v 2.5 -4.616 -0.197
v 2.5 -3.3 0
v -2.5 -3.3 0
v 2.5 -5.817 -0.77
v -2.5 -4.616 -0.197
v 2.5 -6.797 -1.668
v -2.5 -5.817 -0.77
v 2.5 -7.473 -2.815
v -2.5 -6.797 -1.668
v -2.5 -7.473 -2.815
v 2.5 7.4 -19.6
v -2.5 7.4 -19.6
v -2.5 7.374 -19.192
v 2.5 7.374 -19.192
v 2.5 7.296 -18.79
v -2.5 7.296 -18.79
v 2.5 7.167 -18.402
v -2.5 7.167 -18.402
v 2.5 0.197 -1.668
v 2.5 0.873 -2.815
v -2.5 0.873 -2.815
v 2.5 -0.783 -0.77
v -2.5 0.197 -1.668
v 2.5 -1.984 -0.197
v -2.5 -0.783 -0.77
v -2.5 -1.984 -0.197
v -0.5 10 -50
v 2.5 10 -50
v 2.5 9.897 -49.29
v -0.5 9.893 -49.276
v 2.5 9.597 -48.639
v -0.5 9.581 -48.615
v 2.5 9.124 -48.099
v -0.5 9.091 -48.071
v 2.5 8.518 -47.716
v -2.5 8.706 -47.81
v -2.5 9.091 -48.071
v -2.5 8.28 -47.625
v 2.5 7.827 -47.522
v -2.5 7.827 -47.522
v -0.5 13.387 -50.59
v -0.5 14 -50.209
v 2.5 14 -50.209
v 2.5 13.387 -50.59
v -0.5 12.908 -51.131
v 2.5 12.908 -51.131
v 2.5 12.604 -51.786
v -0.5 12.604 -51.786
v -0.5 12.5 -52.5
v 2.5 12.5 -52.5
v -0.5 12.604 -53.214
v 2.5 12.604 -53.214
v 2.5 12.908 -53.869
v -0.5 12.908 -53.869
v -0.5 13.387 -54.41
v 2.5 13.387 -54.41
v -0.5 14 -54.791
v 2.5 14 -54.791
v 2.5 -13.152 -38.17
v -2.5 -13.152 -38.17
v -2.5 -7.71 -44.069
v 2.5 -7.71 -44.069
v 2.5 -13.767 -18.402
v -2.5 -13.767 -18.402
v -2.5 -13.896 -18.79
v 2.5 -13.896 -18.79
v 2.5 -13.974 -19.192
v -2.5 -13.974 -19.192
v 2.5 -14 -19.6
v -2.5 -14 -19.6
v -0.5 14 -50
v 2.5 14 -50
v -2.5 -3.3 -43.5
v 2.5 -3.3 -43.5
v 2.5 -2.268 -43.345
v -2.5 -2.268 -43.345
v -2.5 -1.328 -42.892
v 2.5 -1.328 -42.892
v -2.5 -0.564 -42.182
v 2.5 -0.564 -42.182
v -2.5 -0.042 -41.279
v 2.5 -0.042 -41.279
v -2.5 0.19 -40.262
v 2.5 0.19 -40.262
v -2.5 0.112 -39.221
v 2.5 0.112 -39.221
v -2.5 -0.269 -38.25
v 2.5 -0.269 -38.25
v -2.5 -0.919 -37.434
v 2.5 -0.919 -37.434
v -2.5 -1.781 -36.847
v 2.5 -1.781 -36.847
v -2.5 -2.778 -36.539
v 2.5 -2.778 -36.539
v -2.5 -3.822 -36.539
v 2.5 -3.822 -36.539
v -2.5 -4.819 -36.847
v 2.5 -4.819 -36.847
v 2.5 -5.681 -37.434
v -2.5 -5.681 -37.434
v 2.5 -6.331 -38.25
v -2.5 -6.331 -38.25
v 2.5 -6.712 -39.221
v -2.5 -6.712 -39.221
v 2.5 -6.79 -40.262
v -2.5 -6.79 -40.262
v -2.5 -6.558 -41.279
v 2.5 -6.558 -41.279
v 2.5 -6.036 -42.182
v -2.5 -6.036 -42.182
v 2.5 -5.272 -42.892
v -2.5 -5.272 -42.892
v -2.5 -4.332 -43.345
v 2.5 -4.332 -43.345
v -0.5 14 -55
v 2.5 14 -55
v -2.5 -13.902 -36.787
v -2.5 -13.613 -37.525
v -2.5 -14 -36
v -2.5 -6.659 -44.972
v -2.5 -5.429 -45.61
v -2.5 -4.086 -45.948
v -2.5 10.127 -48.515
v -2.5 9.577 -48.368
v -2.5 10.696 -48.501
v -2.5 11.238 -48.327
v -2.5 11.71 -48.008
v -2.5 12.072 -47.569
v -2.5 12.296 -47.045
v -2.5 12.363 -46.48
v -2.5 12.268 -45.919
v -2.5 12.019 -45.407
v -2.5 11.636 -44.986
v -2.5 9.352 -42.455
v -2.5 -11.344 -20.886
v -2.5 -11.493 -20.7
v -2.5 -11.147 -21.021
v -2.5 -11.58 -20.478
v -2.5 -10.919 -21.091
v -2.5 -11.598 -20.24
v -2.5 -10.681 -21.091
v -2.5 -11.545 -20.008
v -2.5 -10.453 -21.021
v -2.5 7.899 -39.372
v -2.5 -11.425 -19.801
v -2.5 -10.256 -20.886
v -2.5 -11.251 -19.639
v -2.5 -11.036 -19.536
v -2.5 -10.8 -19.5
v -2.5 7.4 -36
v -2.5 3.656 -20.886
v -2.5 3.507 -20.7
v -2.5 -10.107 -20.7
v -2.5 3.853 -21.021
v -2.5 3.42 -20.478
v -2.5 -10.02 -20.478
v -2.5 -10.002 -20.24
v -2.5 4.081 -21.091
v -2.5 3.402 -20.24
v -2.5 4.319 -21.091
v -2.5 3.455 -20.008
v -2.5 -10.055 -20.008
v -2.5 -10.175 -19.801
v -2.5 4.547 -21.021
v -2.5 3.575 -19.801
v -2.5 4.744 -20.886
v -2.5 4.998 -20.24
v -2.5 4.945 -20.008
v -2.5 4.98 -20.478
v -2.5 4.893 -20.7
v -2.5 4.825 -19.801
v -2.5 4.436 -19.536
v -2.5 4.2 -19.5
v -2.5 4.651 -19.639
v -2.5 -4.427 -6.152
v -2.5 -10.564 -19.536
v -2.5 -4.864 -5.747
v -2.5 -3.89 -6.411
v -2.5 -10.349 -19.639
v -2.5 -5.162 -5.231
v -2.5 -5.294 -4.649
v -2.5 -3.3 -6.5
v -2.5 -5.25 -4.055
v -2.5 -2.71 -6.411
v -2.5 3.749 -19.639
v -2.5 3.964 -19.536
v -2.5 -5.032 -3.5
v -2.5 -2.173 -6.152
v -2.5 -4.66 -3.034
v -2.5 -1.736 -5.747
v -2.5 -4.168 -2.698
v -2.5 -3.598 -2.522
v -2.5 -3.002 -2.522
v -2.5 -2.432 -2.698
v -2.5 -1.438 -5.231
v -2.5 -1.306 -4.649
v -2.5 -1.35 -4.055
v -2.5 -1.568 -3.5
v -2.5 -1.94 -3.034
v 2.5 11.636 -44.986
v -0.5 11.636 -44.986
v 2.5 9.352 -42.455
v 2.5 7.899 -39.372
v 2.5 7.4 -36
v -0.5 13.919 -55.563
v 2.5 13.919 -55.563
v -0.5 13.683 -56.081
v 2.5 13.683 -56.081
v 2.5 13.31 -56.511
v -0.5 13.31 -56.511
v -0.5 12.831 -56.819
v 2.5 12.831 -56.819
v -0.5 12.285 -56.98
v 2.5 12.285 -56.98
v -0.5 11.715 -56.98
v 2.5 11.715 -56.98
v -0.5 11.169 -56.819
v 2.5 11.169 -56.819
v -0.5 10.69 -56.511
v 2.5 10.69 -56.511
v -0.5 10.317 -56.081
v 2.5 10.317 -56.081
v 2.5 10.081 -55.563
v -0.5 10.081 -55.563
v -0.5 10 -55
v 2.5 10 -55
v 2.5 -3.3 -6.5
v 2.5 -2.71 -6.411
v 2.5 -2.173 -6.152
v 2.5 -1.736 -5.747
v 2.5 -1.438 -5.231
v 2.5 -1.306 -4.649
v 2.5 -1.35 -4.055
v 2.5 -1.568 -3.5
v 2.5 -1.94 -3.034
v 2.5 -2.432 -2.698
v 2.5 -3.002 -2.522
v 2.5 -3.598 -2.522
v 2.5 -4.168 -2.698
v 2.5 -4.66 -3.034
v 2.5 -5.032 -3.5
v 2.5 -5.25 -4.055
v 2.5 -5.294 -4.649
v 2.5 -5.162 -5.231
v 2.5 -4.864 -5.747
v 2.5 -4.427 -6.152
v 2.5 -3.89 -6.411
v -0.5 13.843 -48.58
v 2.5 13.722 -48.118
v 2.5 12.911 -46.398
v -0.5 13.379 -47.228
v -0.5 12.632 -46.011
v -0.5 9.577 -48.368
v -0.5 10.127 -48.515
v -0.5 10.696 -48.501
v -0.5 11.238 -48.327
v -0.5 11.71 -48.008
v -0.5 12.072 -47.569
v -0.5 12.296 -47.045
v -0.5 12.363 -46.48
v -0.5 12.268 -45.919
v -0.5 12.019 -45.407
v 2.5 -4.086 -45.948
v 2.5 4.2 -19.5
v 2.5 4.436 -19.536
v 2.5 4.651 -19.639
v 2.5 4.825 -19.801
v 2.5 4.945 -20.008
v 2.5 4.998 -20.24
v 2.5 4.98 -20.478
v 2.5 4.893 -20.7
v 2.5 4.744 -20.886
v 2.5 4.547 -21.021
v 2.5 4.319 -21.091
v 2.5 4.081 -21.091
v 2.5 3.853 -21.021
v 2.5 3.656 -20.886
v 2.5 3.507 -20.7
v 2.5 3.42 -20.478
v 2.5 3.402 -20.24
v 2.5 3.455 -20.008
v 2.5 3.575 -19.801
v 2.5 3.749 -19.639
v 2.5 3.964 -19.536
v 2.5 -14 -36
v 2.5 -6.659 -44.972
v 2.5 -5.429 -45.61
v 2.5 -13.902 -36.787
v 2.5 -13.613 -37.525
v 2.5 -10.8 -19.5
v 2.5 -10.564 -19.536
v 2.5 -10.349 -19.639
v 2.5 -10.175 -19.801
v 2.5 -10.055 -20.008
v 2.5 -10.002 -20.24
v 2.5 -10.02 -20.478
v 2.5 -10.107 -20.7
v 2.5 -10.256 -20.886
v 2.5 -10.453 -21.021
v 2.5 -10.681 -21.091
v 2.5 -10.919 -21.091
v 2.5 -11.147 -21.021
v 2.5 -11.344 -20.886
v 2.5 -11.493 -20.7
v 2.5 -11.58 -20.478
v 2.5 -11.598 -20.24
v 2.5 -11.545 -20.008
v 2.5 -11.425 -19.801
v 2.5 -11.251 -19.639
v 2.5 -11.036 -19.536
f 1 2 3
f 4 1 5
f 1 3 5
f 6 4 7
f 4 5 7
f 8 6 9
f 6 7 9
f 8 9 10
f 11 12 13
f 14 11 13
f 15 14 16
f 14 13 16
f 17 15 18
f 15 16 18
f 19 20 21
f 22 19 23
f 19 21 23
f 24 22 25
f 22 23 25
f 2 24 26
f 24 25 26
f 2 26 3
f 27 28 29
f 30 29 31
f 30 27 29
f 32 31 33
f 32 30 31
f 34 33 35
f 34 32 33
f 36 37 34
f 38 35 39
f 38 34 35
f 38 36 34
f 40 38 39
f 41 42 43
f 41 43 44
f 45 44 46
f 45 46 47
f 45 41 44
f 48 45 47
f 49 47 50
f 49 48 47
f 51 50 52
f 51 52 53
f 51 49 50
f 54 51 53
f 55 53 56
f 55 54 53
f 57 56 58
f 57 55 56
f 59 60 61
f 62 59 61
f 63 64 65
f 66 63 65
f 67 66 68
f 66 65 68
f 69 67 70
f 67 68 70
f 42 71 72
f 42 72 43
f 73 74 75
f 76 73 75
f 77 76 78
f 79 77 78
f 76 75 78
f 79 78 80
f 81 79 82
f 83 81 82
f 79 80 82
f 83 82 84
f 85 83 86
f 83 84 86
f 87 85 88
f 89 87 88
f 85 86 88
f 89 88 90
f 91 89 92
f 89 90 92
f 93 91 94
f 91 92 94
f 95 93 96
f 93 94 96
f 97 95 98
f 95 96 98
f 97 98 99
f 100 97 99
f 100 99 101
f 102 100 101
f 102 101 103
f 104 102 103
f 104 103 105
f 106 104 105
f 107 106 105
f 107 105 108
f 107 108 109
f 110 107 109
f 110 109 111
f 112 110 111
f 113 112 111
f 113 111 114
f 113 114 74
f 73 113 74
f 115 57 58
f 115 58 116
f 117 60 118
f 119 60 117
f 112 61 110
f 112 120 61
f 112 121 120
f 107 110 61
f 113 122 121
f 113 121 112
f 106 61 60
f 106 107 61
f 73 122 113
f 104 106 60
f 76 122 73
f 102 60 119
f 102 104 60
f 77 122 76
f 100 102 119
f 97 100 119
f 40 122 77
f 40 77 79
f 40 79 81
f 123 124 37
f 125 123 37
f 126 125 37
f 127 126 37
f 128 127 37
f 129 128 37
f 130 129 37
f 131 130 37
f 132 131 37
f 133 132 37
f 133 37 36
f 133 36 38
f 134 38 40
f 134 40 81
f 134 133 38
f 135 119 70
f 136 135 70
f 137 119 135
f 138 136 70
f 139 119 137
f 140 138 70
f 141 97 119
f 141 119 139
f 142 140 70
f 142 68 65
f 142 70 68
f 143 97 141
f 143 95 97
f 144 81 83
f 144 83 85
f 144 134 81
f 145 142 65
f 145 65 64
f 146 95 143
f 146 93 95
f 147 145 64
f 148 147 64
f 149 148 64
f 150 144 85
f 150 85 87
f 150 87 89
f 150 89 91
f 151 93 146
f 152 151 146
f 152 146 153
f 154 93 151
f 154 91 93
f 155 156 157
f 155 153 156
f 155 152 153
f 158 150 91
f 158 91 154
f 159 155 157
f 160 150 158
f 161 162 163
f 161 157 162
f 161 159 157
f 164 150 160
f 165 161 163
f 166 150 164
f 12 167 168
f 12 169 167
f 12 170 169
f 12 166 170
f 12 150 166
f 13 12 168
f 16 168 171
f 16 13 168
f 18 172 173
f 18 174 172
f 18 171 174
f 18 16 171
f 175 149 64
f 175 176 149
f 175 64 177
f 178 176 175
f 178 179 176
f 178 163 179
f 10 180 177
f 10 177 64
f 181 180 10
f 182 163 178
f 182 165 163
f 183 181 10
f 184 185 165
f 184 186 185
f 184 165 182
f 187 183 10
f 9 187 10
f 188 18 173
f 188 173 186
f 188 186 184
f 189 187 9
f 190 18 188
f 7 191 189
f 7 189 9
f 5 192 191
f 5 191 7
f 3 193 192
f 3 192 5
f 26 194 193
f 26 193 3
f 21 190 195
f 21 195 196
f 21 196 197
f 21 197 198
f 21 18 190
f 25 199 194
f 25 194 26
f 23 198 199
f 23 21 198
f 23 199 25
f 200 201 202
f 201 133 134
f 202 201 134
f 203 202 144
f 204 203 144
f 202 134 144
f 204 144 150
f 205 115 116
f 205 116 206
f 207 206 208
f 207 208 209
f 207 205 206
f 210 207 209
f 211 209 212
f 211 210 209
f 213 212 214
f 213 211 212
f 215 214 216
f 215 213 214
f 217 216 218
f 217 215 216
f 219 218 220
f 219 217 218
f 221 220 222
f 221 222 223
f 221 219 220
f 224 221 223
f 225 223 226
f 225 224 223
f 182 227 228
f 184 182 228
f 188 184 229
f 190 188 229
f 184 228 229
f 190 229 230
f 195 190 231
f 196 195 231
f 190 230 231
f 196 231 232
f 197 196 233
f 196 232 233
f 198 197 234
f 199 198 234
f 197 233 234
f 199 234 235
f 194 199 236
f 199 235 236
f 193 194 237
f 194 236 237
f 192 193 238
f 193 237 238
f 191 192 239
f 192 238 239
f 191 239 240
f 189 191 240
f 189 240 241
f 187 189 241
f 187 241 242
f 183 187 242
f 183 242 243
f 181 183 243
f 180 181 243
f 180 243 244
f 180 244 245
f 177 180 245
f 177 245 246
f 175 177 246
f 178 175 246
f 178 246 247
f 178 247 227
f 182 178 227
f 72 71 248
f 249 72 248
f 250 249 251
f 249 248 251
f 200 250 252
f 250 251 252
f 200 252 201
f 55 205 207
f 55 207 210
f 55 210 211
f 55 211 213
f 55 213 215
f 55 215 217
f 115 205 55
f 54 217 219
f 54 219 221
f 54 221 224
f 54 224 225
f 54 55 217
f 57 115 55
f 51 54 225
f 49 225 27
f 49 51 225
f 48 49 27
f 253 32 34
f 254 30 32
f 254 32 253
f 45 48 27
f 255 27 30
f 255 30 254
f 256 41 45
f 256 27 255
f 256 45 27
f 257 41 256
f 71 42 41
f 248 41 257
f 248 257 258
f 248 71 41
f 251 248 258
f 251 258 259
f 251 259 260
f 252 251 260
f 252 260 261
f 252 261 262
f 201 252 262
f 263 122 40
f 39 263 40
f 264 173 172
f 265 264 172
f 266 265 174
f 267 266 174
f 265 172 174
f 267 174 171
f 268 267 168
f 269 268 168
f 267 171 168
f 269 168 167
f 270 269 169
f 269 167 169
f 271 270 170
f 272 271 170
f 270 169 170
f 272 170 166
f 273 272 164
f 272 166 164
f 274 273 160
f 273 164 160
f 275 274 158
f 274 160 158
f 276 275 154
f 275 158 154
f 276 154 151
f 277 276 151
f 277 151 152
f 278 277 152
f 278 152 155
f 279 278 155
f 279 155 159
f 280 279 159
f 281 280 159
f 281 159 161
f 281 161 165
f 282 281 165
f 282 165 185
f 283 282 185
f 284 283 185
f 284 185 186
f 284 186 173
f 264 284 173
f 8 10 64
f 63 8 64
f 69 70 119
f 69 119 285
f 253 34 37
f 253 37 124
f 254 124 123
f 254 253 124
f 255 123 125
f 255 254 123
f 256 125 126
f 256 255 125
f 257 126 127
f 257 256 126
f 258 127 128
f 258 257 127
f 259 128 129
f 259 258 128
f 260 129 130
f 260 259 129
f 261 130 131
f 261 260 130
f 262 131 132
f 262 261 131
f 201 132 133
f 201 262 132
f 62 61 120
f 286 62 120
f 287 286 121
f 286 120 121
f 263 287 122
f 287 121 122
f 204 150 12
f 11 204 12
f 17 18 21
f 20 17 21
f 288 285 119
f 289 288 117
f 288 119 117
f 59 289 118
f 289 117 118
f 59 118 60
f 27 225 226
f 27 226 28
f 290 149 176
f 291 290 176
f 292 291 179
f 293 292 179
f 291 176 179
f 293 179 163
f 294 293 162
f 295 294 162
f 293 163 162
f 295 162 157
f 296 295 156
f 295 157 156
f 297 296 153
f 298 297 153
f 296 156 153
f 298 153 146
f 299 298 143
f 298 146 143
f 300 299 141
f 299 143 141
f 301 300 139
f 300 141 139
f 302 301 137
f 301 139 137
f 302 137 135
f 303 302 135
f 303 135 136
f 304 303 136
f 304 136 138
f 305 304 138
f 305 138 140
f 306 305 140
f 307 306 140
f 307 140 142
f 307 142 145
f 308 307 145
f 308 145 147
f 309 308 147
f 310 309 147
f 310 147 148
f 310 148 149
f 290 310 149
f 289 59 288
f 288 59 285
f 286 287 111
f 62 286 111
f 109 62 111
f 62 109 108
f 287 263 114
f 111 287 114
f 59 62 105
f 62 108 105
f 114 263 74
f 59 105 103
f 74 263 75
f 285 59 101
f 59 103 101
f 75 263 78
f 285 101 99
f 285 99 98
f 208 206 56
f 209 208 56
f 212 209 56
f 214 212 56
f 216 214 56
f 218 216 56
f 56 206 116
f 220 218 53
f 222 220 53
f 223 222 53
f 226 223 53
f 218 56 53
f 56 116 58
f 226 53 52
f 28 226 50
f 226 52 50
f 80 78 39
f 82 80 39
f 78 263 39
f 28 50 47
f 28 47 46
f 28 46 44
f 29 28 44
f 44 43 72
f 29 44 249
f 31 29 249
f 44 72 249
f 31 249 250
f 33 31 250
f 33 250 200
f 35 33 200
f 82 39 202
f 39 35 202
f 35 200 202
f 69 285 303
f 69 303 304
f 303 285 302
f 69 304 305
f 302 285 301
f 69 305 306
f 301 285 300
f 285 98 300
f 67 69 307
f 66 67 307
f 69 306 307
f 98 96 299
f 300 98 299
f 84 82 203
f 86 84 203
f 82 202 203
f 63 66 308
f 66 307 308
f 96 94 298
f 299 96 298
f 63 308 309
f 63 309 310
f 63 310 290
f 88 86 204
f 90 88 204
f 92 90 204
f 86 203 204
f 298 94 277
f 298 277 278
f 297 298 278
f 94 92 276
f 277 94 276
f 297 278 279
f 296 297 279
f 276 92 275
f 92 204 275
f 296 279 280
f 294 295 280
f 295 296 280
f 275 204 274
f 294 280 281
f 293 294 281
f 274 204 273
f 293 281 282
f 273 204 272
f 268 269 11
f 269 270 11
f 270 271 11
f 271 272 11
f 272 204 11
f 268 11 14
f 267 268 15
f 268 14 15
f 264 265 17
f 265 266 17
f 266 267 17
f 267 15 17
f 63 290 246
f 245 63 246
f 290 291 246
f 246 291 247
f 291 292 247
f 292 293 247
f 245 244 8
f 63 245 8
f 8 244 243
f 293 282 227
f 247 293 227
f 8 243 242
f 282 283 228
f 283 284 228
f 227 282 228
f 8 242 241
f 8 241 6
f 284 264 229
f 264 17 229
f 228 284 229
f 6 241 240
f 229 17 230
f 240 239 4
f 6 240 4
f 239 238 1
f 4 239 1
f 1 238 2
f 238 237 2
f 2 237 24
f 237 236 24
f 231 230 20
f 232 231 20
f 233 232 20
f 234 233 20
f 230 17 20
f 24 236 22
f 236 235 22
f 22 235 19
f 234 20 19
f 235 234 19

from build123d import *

# Parameters (mm, degrees)
ESQUISSE1_W             = 5
ESQUISSE1_H             = 28
EXTRUSION1_DEPTH        = 46
ESQUISSE2_R             = 2
ESQUISSE2_R_2           = 3.5
EXTRUSION2_DEPTH        = 49.342527861
TROU_TARAUD_M21_D       = 1.6
BOSS_EXTRU_2_DEPTH      = 5
ENL_V_MAT_EXTRU_1_DEPTH = 10
ENL_V_START             = 3
ENL_V_MAT_EXTRU_2_DEPTH = 56.9067059


with BuildPart() as part:
    # Esquisse1 → Extrusion1 (new body)
    with BuildSketch(Plane.XY):
        Rectangle(ESQUISSE1_W, ESQUISSE1_H)
    extrude(amount=-EXTRUSION1_DEPTH)

    # Esquisse2 → Extrusion2 (cut, through all)
    with BuildSketch(Plane(origin=(2.5, 0, 0), x_dir=(0, 0, -1), z_dir=(1, 0, 0))):
        with Locations((4.5, -3.3)):
            Circle(ESQUISSE2_R)
        with Locations((40, -3.3)):
            Circle(ESQUISSE2_R_2)
    extrude(amount=-EXTRUSION2_DEPTH, mode=Mode.SUBTRACT)

    # Trou taraudé M21 (through all)
    with Locations(Plane(origin=(2.5, 0, 0), x_dir=(0, 0, -1), z_dir=(1, 0, 0))):
        with Locations((20.3, 4.2), (20.3, -10.8)):
            Hole(TROU_TARAUD_M21_D / 2)

    # Esquisse12 → Boss.-Extru.2 (add)
    with BuildSketch(Plane.ZY.offset(2.5)):
        with BuildLine():
            Line((-46, 14), (-50.208712153, 14))
            ThreePointArc((-50.208712153, 14), (-52.5, 12.5), (-54.791287847, 14))
            Line((-54.791287847, 14), (-55, 14))
            ThreePointArc((-55, 14), (-57, 12), (-55, 10))
            Line((-55, 10), (-50, 10))
            ThreePointArc((-50, 10), (-48.294604063, 9.328011132), (-47.506013794, 7.673299759))
            Line((-47.506013794, 7.673299759), (-46, -14))
            Line((-46, -14), (-46, 14))
        make_face()
    extrude(amount=-BOSS_EXTRU_2_DEPTH)

    # Esquisse13 → Enlèv. mat.-Extru.1 (cut)
    with BuildSketch(Plane.ZY.offset(2.5)):
        with BuildLine():
            ThreePointArc((-47.521517479, 7.82729863), (-47.512573575, 7.750419205), (-47.506013794, 7.673299759))
            Line((-47.506013794, 7.673299759), (-46, -14))
            Line((-46, -14), (-36, -14))
            ThreePointArc((-36, -14), (-37.164860583, -13.780452956), (-38.169882605, -13.151937389))
            Line((-38.169882605, -13.151937389), (-44.068529884, -7.709882605))
            ThreePointArc((-44.068529884, -7.709882605), (-45.326210473, -6.062513711), (-45.94835805, -4.085516713))
            Line((-45.94835805, -4.085516713), (-47.521517479, 7.82729863))
        make_face()
        with BuildLine():
            ThreePointArc((-18.401732057, -13.767179458), (-18.989661678, -13.941255662), (-19.6, -14))
            Line((-19.6, -14), (0, -14))
            Line((0, -14), (0, -3.3))
            ThreePointArc((0, -3.3), (-0.769531576, -5.81666552), (-2.814935705, -7.472596113))
            Line((-2.814935705, -7.472596113), (-18.401732057, -13.767179458))
        make_face()
        with BuildLine():
            ThreePointArc((-2.814935705, 0.872596113), (-0.769531576, -0.78333448), (0, -3.3))
            Line((0, -3.3), (0, 14))
            Line((0, 14), (-50, 14))
            ThreePointArc((-50, 14), (-47.228274994, 13.379416679), (-44.985807313, 11.636166305))
            ThreePointArc((-44.985807313, 11.636166305), (-40.96713796, 8.512131601), (-36, 7.4))
            Line((-36, 7.4), (-19.6, 7.4))
            ThreePointArc((-19.6, 7.4), (-18.989661678, 7.341255662), (-18.401732057, 7.167179458))
            Line((-18.401732057, 7.167179458), (-2.814935705, 0.872596113))
        make_face()
    extrude(amount=-ENL_V_MAT_EXTRU_1_DEPTH, mode=Mode.SUBTRACT)

    # Esquisse14 → Enlèv. mat.-Extru.2 (cut, through all)
    with BuildSketch(Plane.ZY.offset(-2.5).offset(ENL_V_START)):
        with BuildLine():
            ThreePointArc((-44.985807313, 11.636166305), (-47.228274994, 13.379416679), (-50, 14))
            Line((-50, 14), (-50.208712153, 14))
            ThreePointArc((-50.208712153, 14), (-52.5, 12.5), (-54.791287847, 14))
            Line((-54.791287847, 14), (-55, 14))
            ThreePointArc((-55, 14), (-57, 12), (-55, 10))
            Line((-55, 10), (-50, 10))
            ThreePointArc((-50, 10), (-48.933951921, 9.761314107), (-48.071464351, 9.090833194))
            ThreePointArc((-48.071464351, 9.090833194), (-47.801302388, 11.906328268), (-44.985807313, 11.636166305))
        make_face()
    extrude(amount=ENL_V_MAT_EXTRU_2_DEPTH, mode=Mode.SUBTRACT)


solid = part.part
